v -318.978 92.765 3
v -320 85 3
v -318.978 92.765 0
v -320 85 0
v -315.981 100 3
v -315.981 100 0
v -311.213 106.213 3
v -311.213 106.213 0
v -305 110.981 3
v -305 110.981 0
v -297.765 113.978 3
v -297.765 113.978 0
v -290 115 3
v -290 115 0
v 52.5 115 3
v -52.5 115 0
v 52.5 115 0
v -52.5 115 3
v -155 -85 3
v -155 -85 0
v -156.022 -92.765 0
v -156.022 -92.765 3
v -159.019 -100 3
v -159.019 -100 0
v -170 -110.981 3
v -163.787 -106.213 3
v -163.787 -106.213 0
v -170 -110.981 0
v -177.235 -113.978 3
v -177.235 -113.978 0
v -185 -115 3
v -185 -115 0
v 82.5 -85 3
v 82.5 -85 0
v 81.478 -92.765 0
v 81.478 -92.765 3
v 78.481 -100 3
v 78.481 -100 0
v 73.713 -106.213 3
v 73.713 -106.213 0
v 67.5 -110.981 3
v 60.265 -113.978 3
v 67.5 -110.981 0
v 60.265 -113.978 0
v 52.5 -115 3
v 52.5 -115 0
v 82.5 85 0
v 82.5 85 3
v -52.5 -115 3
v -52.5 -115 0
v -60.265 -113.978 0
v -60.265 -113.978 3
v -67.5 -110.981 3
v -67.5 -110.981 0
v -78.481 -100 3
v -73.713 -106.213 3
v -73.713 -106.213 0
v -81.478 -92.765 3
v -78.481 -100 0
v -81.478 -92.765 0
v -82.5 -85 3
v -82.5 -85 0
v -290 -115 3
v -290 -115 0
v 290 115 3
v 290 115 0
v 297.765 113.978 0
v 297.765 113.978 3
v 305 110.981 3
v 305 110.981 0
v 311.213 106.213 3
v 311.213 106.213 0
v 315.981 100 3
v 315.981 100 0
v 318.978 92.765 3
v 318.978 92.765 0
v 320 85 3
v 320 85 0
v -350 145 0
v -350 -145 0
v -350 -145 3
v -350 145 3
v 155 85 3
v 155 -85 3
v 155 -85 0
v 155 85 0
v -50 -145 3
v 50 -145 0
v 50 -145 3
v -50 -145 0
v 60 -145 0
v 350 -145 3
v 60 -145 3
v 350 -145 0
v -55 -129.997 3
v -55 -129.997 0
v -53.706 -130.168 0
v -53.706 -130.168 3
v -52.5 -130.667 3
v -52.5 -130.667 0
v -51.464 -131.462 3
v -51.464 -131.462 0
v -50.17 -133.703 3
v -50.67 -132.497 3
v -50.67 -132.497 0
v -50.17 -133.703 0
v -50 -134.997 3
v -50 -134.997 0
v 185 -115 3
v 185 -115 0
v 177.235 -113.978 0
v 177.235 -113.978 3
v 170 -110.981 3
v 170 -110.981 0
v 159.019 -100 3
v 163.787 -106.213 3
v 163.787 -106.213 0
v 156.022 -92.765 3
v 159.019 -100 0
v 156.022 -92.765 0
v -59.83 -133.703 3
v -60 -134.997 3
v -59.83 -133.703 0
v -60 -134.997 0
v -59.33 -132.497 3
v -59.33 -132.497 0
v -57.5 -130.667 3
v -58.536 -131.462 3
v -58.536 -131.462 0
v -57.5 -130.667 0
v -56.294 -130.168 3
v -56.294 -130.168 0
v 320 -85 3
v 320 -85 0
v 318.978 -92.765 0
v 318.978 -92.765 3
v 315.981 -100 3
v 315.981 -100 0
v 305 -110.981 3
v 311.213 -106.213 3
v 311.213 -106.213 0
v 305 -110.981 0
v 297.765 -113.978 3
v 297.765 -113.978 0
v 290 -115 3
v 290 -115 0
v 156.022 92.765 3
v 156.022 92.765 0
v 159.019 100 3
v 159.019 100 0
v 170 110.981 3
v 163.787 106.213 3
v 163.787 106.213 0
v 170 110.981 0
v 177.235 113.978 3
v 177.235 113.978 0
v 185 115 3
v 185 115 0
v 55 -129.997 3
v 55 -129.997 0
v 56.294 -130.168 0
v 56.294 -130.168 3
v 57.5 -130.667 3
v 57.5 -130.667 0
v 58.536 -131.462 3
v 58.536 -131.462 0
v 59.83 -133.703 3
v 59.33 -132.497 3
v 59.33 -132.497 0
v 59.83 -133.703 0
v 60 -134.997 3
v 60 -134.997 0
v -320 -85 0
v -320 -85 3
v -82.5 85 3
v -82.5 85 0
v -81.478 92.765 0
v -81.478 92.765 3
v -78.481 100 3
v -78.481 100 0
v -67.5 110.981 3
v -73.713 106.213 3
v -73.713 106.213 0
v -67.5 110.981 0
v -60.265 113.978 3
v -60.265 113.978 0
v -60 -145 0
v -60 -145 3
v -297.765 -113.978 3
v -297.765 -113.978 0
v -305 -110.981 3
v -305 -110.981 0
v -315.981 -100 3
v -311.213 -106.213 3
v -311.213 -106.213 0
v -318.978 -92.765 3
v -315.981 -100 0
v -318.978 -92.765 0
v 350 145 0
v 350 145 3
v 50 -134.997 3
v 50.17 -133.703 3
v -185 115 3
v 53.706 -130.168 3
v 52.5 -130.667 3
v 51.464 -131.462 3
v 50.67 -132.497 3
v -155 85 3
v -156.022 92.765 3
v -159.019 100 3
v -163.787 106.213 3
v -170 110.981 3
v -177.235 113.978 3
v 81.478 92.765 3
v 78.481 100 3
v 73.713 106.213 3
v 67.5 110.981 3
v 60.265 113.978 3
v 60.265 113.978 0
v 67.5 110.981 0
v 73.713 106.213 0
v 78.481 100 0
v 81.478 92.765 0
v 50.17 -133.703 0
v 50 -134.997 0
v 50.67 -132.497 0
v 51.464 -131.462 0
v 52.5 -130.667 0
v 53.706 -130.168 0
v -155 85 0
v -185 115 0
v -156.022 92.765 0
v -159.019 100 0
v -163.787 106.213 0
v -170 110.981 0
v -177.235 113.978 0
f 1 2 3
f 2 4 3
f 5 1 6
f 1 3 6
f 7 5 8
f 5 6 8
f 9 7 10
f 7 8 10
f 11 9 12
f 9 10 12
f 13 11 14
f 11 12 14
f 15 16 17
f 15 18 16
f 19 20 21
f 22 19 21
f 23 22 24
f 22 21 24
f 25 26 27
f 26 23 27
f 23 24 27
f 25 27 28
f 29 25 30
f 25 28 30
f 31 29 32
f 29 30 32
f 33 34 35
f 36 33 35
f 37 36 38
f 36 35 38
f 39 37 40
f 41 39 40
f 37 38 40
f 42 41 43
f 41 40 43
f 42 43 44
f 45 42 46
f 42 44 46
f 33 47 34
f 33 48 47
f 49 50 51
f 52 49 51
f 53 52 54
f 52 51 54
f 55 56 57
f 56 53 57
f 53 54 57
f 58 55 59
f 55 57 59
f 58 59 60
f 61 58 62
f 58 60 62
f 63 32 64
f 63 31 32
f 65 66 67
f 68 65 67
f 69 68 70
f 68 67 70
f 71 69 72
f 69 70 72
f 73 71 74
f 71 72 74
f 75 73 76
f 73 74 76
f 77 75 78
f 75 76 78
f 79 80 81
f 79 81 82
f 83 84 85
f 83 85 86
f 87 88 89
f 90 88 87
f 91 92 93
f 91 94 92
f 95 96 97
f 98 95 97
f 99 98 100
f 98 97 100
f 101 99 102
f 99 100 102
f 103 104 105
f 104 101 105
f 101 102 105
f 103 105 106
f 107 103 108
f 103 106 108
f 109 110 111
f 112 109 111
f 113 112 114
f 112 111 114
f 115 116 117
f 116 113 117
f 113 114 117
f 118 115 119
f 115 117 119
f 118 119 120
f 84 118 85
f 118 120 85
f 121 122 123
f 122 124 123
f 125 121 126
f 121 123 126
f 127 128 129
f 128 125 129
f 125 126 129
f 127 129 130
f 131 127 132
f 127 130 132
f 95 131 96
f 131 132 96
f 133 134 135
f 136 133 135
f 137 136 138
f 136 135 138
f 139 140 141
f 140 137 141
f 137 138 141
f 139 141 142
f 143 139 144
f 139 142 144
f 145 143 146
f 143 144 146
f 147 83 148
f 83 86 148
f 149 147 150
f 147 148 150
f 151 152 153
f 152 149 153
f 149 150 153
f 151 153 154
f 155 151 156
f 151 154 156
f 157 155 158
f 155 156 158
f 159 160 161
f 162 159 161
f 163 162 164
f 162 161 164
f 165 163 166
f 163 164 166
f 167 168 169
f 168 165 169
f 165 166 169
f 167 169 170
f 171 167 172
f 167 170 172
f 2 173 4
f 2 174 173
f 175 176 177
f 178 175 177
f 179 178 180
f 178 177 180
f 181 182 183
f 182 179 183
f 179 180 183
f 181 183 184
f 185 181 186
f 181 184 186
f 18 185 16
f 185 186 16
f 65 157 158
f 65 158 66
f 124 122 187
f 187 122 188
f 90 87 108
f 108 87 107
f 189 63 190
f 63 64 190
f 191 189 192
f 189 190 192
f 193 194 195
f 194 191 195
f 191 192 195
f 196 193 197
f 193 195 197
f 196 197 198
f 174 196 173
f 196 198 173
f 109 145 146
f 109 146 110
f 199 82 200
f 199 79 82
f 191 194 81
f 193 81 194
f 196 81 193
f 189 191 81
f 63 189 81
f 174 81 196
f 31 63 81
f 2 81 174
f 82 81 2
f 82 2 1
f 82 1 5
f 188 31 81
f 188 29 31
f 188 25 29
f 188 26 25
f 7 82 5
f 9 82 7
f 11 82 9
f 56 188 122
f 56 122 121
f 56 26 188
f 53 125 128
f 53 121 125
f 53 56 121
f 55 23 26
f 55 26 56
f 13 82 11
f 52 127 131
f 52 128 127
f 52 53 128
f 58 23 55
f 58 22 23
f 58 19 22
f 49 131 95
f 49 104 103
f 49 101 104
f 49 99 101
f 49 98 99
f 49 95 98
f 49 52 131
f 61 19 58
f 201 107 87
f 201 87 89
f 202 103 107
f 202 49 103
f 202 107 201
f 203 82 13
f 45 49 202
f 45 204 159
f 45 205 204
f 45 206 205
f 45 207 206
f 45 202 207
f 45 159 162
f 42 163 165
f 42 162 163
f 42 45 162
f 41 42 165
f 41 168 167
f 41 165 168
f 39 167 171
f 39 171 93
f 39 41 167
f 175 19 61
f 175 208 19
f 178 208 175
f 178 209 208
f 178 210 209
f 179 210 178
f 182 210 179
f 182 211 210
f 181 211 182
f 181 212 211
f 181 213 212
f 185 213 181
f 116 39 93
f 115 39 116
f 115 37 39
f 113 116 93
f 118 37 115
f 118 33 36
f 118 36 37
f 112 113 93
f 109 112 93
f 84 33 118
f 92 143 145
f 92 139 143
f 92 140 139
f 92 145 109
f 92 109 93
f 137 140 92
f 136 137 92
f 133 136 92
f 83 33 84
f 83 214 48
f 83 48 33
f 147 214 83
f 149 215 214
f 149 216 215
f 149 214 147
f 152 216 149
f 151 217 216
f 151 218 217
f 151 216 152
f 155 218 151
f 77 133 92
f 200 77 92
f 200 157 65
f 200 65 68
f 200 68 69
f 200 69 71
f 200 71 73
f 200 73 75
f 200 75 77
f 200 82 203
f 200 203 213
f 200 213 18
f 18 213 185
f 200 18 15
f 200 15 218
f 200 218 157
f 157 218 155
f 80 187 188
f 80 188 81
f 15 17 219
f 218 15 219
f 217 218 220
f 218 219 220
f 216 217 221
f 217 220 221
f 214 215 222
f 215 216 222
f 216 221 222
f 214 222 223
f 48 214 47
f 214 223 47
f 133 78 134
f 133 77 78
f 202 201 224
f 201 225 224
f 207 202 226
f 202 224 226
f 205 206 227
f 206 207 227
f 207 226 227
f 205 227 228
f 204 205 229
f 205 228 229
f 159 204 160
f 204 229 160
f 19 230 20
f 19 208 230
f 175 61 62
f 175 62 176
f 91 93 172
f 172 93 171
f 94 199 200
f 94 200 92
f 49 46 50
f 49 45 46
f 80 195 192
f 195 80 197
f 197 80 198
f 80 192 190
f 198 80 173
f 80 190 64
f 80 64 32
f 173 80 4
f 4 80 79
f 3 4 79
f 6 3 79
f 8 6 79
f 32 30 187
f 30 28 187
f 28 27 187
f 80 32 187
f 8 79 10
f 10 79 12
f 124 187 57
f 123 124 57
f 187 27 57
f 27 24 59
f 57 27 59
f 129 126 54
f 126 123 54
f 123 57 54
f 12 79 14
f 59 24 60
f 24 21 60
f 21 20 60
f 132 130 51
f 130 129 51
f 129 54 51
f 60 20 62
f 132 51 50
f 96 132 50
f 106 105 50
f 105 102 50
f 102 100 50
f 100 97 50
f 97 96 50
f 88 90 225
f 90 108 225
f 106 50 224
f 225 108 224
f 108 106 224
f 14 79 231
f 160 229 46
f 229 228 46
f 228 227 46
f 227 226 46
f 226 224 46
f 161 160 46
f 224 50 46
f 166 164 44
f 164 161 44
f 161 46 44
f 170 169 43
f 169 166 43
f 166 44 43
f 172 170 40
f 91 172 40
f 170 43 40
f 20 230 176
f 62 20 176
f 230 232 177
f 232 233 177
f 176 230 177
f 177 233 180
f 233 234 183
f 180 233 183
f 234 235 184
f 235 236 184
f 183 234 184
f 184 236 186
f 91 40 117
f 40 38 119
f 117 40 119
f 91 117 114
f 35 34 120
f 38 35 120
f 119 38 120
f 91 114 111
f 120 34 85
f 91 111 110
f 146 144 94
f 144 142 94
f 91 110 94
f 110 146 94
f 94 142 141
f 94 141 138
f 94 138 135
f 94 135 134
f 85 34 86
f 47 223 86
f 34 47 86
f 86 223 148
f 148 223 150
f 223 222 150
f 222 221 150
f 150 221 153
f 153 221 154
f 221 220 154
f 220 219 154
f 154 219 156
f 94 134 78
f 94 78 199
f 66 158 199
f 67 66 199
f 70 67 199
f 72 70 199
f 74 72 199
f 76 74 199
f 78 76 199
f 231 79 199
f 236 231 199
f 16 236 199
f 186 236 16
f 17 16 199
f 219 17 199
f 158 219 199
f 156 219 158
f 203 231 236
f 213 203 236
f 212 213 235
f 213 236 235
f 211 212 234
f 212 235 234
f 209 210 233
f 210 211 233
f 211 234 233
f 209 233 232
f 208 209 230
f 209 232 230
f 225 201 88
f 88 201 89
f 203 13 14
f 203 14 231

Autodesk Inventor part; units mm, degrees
ref_plane "YZ Plane" through (0, 0, 0) normal (1, 0, 0) x (0, 1, 0)
ref_plane "XZ Plane" through (0, 0, 0) normal (0, 1, 0) x (-1, 0, 0)
ref_plane "XY Plane" through (0, 0, 0) normal (0, 0, 1) x (1, 0, 0)
sketch "Sketch1" plane through (0, 0, 0) normal (0, 0, 1) x (1, 0, 0)
  line L0 (350, -145) -> (-350, -145)
  line L1 (-350, -145) -> (-350, 145)
  line L2 (-350, 145) -> (350, 145)
  line L3 (350, 145) -> (350, -145)
  line L4 (350, -145) -> (-350, 145) construction
  line L5 (-350, -145) -> (350, 145) construction
  point P0 (0, 0)
  dimension "d0" = 290
  dimension "d1" = 700
extrude "Extrusion1" add sketch "Sketch1" along normal blind 3
sketch "Sketch2" plane through (0, 0, 3) normal (0, 0, 1) x (1, 0, 0)
  line L0 (-320, 115) -> (-155, 115)
  line L1 (-155, 115) -> (-155, -115)
  line L2 (-155, -115) -> (-320, -115)
  line L3 (-320, -115) -> (-320, 115)
  line L4 (-350, 145) -> (-350, -145) projected
  line L5 (350, 145) -> (-350, 145) projected
  line L6 (-350, -145) -> (350, -145) projected
  point P0 (0, 0)
  dimension "d4" = 30
  dimension "d5" = 30
  dimension "d6" = 30
  dimension "d7" = 165
extrude "Extrusion2" cut sketch "Sketch2" against normal blind 3
fillet "Fillet1" radius 30 4 edges at (-320, 115, 1.5) (-155, 115, 1.5) (-320, -115, 1.5) (-155, -115, 1.5)
mirror "Mirror1" about plane through (0, 0, 0) normal (1, 0, 0) of "Extrusion2", "Fillet1"
sketch "Sketch3" plane through (0, 0, 3) normal (0, 0, 1) x (1, 0, 0)
  line L0 (-290, 115) -> (-185, 115) projected
  line L1 (-155, 85) -> (-155, -85) projected
  line L2 (-185, -115) -> (-290, -115) projected
  line L3 (350, 145) -> (-350, 145) projected
  line L4 (-350, -145) -> (350, -145) projected
  line L5 (-350, 145) -> (-350, -145) projected
  line L6 (350, -145) -> (350, 145) projected
  line L7 (82.5, -115) -> (-82.5, -115)
  line L8 (-82.5, -115) -> (-82.5, 115)
  line L9 (-82.5, 115) -> (82.5, 115)
  line L10 (82.5, 115) -> (82.5, -115)
  line L11 (82.5, -115) -> (-82.5, 115) construction
  line L12 (-82.5, -115) -> (82.5, 115) construction
  line L13 (-320, -85) -> (-320, 85) projected
  point P0 (0, 0)
  dimension "d11" = 165
  dimension "d12" = 165
extrude "Extrusion3" cut sketch "Sketch3" against normal blind 3 contours L7 L8 L9 L10
fillet "Fillet2" radius 30 4 edges at (82.5, 115, 1.5) (-82.5, 115, 1.5) (-82.5, -115, 1.5) (82.5, -115, 1.5)
sketch "Sketch4" plane through (0, 0, 3) normal (0, 0, 1) x (1, 0, 0)
  line L0 (-350, 145) -> (-350, -145) projected
  line L1 (-350, -145) -> (350, -145) projected
  line L2 (-60, -145) -> (-50, -145)
  line L3 (-50, -145) -> (-50, -129.9972)
  line L4 (-50, -129.9972) -> (-60, -129.9972)
  line L5 (-60, -129.9972) -> (-60, -145)
  point P0 (0, 0)
  dimension "d16" = 290
  dimension "d17" = 10
extrude "Extrusion4" cut sketch "Sketch4" against normal blind 3
fillet "Fillet3" radius 5 2 edges at (-60, -129.9972, 1.5) (-50, -129.9972, 1.5)
mirror "Mirror2" about plane through (0, 0, 0) normal (1, 0, 0) of "Extrusion4", "Fillet3"
equation "\"d12\" = d11"
equation "\"d20\" = 0.5 * d17"
properties part number "GBX_020.1-front-MDF"
